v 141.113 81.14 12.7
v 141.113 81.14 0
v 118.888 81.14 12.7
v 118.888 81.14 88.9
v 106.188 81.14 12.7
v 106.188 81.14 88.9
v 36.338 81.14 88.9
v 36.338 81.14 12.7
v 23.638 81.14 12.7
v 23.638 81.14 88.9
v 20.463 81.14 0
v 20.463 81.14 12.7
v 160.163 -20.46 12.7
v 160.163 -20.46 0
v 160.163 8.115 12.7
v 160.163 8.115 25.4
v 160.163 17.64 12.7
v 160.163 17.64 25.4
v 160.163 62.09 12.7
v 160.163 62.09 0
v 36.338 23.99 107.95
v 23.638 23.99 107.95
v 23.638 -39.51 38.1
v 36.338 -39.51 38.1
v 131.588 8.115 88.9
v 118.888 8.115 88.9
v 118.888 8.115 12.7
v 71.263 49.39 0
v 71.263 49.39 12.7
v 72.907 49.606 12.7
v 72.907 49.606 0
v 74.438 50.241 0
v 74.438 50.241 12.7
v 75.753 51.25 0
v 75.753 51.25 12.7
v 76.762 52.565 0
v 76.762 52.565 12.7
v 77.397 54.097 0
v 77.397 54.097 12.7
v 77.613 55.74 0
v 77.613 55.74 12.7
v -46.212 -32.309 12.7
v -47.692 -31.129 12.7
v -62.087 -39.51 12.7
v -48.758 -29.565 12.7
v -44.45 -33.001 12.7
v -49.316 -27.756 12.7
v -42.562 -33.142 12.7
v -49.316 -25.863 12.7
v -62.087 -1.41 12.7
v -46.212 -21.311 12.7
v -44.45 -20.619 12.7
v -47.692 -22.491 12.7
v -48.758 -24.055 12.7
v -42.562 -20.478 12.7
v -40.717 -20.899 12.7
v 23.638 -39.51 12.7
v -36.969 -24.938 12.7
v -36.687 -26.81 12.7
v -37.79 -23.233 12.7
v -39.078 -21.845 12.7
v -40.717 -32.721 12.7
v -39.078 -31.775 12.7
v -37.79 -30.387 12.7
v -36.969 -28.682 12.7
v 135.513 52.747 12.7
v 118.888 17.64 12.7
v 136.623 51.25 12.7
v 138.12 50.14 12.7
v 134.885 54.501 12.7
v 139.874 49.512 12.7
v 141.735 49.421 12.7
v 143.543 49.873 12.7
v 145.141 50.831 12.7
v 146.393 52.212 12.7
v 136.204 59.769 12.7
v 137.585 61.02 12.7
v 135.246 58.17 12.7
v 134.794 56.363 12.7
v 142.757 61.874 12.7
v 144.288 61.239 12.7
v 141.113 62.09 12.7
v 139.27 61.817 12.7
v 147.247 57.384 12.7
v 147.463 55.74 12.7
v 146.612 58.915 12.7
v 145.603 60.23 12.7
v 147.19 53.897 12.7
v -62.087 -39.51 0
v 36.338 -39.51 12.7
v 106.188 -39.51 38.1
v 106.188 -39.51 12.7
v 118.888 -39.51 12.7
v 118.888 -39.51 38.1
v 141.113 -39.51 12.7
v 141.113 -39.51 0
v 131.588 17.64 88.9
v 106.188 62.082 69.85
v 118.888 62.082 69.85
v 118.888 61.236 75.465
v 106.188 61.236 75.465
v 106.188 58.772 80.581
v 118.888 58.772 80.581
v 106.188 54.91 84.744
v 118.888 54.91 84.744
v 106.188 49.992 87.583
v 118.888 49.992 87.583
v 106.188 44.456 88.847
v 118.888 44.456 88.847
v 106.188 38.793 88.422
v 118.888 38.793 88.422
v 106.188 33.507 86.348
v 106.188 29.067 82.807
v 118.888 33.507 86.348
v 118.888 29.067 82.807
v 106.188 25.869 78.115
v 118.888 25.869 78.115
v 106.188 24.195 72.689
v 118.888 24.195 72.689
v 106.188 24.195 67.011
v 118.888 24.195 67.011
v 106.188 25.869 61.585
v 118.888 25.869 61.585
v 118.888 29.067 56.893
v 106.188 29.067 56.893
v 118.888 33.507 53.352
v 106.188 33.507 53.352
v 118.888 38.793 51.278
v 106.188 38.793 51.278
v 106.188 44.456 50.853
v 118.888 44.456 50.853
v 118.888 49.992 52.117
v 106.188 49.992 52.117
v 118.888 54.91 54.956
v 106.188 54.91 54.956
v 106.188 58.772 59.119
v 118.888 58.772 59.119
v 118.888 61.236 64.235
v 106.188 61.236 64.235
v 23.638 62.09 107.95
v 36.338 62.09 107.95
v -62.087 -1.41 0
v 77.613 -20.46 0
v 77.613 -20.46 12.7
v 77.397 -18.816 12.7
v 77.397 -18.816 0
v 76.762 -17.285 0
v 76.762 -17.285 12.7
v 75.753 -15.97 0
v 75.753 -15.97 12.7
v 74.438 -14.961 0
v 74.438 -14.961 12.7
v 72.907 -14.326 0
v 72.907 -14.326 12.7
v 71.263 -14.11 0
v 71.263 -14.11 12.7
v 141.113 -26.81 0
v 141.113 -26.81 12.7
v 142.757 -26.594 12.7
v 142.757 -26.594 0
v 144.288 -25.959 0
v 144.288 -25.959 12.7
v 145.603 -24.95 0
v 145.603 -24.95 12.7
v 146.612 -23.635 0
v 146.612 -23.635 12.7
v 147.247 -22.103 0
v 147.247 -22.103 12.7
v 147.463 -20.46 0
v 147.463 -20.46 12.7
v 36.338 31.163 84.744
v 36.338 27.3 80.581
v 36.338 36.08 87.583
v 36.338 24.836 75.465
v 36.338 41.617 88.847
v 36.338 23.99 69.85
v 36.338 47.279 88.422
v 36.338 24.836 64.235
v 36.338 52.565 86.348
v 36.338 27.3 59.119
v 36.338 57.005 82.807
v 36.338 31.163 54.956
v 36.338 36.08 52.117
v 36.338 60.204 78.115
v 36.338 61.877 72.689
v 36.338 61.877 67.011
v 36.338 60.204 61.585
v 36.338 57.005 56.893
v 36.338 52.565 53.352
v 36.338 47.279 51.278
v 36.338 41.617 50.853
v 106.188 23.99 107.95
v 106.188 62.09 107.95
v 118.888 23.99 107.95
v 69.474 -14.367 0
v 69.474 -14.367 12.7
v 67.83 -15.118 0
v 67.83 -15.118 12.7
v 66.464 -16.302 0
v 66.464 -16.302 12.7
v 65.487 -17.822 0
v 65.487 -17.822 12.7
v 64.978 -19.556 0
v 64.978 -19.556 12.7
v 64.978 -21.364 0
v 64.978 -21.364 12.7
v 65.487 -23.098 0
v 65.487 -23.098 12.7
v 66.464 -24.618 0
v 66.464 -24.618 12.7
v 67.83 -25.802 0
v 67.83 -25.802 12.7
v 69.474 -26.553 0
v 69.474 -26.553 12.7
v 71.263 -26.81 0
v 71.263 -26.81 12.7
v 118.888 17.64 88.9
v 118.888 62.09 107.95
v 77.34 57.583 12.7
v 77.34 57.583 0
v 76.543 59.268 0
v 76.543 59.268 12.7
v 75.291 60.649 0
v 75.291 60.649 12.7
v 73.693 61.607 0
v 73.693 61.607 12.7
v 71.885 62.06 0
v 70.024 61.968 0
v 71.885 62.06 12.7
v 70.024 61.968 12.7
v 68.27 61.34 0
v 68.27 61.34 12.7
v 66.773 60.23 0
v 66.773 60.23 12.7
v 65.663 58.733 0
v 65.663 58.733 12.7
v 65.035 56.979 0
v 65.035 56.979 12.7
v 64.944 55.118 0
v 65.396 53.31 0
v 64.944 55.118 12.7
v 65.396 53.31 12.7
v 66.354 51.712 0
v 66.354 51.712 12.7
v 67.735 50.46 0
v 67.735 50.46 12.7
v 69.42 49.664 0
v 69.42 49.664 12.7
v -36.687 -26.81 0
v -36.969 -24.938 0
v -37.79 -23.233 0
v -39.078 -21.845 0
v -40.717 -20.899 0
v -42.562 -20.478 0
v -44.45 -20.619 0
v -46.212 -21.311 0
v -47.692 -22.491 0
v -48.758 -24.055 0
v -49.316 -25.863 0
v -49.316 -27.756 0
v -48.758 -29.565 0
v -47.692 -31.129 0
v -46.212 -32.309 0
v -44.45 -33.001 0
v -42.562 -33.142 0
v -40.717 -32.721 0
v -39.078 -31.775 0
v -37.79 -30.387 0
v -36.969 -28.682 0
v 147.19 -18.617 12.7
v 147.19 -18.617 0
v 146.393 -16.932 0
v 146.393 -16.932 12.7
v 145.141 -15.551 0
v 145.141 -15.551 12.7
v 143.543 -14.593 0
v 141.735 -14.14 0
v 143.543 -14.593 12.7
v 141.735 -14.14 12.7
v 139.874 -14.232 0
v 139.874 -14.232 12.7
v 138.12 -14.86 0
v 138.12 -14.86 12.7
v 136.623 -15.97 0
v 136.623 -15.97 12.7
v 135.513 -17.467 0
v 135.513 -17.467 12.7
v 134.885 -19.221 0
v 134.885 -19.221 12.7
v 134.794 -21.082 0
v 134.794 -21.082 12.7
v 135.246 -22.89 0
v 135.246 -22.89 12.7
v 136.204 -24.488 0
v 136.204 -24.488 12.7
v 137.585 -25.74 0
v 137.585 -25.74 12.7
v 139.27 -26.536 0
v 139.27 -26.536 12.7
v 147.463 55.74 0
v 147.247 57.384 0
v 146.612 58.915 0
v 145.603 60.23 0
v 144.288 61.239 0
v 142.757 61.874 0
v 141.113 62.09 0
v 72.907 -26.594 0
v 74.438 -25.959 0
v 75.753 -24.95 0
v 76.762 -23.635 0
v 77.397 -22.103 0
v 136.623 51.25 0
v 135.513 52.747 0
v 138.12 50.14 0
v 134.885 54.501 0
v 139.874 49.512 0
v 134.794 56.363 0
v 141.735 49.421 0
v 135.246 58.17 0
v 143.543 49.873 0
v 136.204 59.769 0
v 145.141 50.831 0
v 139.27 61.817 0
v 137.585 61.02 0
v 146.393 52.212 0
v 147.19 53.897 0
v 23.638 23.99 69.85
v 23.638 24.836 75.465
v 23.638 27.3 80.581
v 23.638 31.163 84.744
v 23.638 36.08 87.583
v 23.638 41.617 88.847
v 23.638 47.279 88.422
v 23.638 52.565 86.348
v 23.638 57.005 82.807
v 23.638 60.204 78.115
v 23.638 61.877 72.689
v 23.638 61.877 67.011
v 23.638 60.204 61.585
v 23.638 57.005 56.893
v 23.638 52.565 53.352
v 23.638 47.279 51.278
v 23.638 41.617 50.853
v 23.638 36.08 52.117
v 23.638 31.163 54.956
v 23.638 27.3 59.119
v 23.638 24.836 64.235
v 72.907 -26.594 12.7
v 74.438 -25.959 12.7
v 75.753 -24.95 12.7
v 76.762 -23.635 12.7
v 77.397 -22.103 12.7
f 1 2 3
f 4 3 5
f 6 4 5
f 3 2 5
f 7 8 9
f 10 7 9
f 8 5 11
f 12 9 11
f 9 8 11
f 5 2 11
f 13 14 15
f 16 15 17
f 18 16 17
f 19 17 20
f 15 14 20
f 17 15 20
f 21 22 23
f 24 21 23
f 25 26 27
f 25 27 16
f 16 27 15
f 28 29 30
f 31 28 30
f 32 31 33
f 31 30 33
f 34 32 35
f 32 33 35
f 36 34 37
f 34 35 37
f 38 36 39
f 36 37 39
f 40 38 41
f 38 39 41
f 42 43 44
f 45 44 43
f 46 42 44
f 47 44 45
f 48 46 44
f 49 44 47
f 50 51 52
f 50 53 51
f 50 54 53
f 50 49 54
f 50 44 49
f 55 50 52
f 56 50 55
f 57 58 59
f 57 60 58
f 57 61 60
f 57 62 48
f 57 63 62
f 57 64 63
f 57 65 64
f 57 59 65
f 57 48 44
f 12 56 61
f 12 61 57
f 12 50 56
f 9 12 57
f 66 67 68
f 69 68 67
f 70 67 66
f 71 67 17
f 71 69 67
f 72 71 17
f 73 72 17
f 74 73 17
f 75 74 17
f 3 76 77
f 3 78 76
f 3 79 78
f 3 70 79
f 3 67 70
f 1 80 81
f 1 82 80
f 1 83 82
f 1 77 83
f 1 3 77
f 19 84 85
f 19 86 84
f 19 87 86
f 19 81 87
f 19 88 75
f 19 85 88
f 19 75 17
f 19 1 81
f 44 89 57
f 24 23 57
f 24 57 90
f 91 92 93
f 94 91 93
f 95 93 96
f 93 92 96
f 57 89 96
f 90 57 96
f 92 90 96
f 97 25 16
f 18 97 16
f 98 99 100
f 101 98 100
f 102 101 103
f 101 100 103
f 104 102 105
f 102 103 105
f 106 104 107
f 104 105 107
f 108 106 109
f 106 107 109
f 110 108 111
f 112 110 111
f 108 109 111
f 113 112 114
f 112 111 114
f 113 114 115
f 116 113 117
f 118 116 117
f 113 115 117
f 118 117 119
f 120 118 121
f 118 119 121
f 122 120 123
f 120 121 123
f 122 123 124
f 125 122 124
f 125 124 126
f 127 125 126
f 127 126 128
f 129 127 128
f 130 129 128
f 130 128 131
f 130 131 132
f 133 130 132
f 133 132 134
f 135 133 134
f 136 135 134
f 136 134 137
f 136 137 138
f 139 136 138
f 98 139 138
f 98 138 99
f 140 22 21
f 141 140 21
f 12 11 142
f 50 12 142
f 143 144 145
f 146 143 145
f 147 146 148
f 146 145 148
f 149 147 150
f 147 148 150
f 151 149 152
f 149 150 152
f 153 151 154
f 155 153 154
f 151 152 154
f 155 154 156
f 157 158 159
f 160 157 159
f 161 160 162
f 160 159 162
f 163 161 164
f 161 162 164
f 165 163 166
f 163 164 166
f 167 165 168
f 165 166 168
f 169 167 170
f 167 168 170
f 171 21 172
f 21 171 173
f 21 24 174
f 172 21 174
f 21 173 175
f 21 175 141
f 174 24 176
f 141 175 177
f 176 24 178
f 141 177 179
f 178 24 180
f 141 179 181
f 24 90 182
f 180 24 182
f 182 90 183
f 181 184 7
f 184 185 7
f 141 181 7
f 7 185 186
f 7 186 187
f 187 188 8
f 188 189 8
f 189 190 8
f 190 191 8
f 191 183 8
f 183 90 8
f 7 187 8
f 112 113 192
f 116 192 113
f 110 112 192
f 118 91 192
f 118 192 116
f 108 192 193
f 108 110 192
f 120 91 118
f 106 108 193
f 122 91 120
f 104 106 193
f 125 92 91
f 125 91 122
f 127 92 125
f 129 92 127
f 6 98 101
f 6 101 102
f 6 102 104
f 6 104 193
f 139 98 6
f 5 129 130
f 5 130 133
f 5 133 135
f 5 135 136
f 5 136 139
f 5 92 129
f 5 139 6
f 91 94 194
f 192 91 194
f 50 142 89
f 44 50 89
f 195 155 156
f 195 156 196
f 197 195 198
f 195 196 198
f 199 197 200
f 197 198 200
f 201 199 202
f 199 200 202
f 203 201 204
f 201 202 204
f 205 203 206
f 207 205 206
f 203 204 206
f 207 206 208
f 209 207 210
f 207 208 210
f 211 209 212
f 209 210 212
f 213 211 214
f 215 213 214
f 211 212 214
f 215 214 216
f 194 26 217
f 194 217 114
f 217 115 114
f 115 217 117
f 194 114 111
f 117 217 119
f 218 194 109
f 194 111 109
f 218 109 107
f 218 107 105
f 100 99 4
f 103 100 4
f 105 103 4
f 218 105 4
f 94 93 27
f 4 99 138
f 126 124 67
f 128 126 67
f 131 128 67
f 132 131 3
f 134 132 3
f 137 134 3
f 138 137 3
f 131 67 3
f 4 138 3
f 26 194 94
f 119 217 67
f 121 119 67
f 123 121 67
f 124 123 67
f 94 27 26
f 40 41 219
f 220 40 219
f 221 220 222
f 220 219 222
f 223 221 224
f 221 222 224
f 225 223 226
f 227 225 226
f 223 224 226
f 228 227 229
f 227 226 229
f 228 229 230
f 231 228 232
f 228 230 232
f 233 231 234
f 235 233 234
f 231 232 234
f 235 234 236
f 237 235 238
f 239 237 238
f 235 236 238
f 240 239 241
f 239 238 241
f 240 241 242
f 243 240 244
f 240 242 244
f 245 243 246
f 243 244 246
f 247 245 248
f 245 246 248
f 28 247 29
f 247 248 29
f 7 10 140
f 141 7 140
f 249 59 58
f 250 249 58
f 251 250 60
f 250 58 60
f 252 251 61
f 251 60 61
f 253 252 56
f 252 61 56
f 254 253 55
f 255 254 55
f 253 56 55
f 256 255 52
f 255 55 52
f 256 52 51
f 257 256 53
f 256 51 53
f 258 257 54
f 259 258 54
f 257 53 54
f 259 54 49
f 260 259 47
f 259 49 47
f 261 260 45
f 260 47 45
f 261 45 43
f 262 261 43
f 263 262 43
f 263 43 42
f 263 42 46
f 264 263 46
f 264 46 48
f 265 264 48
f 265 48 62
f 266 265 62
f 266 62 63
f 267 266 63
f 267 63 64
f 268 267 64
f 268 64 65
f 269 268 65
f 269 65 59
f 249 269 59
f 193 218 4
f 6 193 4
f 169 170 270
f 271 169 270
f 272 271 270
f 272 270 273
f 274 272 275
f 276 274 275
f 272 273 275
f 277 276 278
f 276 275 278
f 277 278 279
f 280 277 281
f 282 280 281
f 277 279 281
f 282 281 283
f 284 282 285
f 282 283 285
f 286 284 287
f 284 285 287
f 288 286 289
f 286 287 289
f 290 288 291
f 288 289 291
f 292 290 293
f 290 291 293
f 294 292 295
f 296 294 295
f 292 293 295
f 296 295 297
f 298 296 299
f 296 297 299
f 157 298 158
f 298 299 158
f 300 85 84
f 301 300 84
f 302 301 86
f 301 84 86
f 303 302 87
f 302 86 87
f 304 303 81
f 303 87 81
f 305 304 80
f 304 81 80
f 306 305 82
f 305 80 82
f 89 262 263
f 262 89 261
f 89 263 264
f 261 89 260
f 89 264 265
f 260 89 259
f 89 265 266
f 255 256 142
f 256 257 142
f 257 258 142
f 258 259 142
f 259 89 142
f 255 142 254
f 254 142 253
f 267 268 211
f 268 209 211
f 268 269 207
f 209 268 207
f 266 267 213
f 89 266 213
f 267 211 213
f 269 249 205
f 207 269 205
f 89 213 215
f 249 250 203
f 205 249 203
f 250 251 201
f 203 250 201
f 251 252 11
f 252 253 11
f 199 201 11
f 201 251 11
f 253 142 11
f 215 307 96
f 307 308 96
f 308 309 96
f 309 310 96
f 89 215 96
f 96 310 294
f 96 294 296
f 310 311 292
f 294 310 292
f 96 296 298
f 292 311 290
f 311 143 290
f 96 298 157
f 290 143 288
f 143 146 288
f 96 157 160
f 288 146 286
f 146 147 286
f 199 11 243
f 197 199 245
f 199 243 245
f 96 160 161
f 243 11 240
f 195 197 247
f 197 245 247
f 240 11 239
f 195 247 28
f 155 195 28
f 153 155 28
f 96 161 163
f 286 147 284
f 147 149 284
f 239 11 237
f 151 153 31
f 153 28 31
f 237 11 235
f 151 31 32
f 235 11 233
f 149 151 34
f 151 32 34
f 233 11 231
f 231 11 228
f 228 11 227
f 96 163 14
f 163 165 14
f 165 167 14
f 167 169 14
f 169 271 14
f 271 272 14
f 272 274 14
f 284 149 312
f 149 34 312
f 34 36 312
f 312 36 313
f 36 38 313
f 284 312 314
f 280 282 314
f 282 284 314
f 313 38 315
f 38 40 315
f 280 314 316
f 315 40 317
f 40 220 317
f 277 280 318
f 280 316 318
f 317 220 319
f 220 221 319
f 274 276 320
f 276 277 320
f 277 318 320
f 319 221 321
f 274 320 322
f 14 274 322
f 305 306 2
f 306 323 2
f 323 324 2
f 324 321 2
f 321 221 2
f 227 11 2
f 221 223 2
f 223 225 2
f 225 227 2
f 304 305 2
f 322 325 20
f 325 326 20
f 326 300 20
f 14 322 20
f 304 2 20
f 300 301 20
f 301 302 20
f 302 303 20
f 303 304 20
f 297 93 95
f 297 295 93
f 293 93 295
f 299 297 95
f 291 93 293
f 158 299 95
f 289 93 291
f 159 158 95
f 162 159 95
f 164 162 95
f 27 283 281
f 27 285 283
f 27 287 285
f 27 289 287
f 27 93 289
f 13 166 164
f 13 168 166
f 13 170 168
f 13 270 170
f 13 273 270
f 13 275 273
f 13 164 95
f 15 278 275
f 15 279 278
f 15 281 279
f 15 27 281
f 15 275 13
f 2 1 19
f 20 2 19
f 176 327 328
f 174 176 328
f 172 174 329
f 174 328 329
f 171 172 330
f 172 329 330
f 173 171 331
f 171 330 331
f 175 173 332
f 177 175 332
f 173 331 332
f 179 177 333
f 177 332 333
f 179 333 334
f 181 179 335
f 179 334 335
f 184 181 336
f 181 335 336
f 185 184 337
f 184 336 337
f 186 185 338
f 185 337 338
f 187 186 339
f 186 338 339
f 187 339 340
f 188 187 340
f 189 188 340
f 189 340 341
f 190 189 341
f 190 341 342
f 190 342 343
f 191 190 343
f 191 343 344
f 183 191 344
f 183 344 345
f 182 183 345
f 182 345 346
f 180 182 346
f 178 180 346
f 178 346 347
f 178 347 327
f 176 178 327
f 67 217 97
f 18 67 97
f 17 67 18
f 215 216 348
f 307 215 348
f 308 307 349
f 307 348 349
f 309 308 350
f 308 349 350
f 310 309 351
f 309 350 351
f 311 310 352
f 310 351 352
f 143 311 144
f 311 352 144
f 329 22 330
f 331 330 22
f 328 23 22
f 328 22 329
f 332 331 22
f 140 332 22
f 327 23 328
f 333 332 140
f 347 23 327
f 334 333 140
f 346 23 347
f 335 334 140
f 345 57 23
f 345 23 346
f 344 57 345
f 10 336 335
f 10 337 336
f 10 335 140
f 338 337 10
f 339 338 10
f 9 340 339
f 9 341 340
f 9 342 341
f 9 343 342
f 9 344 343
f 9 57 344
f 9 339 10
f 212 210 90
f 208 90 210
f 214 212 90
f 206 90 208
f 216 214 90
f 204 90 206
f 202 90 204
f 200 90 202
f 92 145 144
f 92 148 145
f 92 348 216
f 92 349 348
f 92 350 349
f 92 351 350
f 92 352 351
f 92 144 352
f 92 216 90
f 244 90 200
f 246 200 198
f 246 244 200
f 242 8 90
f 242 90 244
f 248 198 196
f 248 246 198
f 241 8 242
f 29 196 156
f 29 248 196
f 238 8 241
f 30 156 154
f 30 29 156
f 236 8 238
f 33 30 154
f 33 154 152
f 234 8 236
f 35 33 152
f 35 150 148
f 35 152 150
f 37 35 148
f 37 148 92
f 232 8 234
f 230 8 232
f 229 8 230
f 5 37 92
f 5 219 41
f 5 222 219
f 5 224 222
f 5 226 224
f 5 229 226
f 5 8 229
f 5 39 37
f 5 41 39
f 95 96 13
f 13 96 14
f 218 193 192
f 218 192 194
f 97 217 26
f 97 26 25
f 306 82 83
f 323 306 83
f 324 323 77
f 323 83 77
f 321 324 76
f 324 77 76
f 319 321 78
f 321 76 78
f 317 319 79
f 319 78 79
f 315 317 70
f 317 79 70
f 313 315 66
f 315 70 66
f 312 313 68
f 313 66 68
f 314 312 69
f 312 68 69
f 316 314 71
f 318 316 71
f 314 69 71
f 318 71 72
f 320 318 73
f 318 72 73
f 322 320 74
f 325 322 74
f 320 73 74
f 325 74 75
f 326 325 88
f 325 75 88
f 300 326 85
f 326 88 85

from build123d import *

# Parameters (mm, degrees)
F1_DEPTH  = 12.7
F3_DEPTH  = 25.4
F4_W      = 12.7
F4_H      = 120.65
F5_DEPTH  = 95.25
F7_DEPTH  = 25.4
F9_DEPTH  = 25.4
F11_DEPTH = 25.4
F12_W     = 41.275
F12_H     = 9.525
F13_DEPTH = 76.2
F15_DEPTH = 25.4
F17_DEPTH = 25.4
F19_DEPTH = 25.4
F21_DEPTH = 25.4
F23_DEPTH = 25.4
F24_R     = 19.05
F25_DEPTH = 25.4
F27_DEPTH = 25.4


with BuildPart() as f1:
    # F0 (on Top) → F1 (new body)
    with BuildSketch(Plane.XY):
        Polygon((20.463030386, 81.1401112616), (-62.086969614, -1.4098887384), (-62.086969614, -39.5098887384), (141.113030386, -39.5098887384), (160.163030386, -20.4598887384), (160.163030386, 81.1401112616), (71.263030386, 81.1401112616), (36.338030386, 81.1401112616), align=None)
    extrude(amount=F1_DEPTH)

    # F2 (on face) → F3 (cut)
    with BuildSketch(Plane.XY.offset(12.7)):
        Polygon((160.163030386, 62.0901112616), (160.163030386, 81.1401112616), (141.113030386, 81.1401112616), align=None)
    extrude(amount=-F3_DEPTH, mode=Mode.SUBTRACT)

    # F4 (on face) → F5 (join)
    with BuildSketch(Plane.XY.offset(12.7)):
        with Locations((112.538030386, 20.8151112616)):
            Rectangle(F4_W, F4_H)
        with Locations((29.988030386, 20.8151112616)):
            Rectangle(F4_W, F4_H)
    extrude(amount=F5_DEPTH)

    # F6 (on face) → F7 (cut)
    with BuildSketch(Plane(origin=(23.638030386, 0, 0), x_dir=(0, -1, 0), z_dir=(-1, 0, 0))):
        Polygon((-62.0901112616, 107.95), (-81.1401112616, 107.95), (-81.1401112616, 88.9), align=None)
    extrude(amount=-F7_DEPTH, mode=Mode.SUBTRACT)

    # F8 (on face) → F9 (cut)
    with BuildSketch(Plane(origin=(23.638030386, 0, 0), x_dir=(0, -1, 0), z_dir=(-1, 0, 0))):
        Polygon((39.5098887384, 107.95), (-23.9901112616, 107.95), (39.5098887384, 38.1), align=None)
    extrude(amount=-F9_DEPTH, mode=Mode.SUBTRACT)

    # F10 (on face) → F11 (cut)
    with BuildSketch(Plane.YZ.offset(118.888030386)):
        Polygon((-39.5098887384, 38.1), (23.9901112616, 107.95), (-39.5098887384, 107.95), align=None)
        Polygon((62.0901112616, 107.95), (81.1401112616, 88.9), (81.1401112616, 107.95), align=None)
    extrude(amount=-F11_DEPTH, mode=Mode.SUBTRACT)

    # F12 (on face) → F13 (join)
    with BuildSketch(Plane.XY.offset(12.7)):
        with Locations((139.525530386, 12.8776112616)):
            Rectangle(F12_W, F12_H)
    extrude(amount=F13_DEPTH)

    # F14 (on face) → F15 (cut)
    with BuildSketch(Plane.XZ.offset(-8.1151112616)):
        Polygon((160.163030386, 88.9), (131.588030386, 88.9), (160.163030386, 25.4), align=None)
    extrude(amount=-F15_DEPTH, mode=Mode.SUBTRACT)

    # F16 (on face) → F17 (cut)
    with BuildSketch(Plane.XY.offset(12.7)):
        with BuildLine():
            ThreePointArc((-49.386969614, -26.8098887384), (-43.036969614, -33.1598887384), (-36.686969614, -26.8098887384))
            ThreePointArc((-36.686969614, -26.8098887384), (-43.036969614, -20.4598887384), (-49.386969614, -26.8098887384))
        make_face()
    extrude(amount=-F17_DEPTH, mode=Mode.SUBTRACT)

    # F18 (on face) → F19 (cut)
    with BuildSketch(Plane.XY.offset(12.7)):
        with BuildLine():
            ThreePointArc((141.113030386, -26.8098887384), (145.6031584465, -24.9500167989), (147.463030386, -20.4598887384))
            ThreePointArc((147.463030386, -20.4598887384), (136.6229023254, -15.9697606779), (141.113030386, -26.8098887384))
        make_face()
    extrude(amount=-F19_DEPTH, mode=Mode.SUBTRACT)

    # F20 (on face) → F21 (cut)
    with BuildSketch(Plane.XY.offset(12.7)):
        with BuildLine():
            ThreePointArc((147.463030386, 55.7401112616), (145.6031584465, 60.2302393221), (141.113030386, 62.0901112616))
            ThreePointArc((141.113030386, 62.0901112616), (136.6229023254, 51.2499832011), (147.463030386, 55.7401112616))
        make_face()
    extrude(amount=-F21_DEPTH, mode=Mode.SUBTRACT)

    # F22 (on face) → F23 (cut)
    with BuildSketch(Plane.XY.offset(12.7)):
        with BuildLine():
            ThreePointArc((71.263030386, -14.1098887384), (64.913030386, -20.4598887384), (71.263030386, -26.8098887384))
            Line((71.263030386, -26.8098887384), (71.263030386, -20.4598887384))
            Line((71.263030386, -20.4598887384), (71.263030386, -14.1098887384))
        make_face()
        with BuildLine():
            ThreePointArc((77.613030386, 55.7401112616), (66.7729023254, 60.2302393221), (71.263030386, 49.3901112616))
            ThreePointArc((71.263030386, 49.3901112616), (75.7531584465, 51.2499832011), (77.613030386, 55.7401112616))
        make_face()
        with BuildLine():
            Line((71.263030386, -20.4598887384), (71.263030386, -26.8098887384))
            ThreePointArc((71.263030386, -26.8098887384), (75.7531584465, -24.9500167989), (77.613030386, -20.4598887384))
            ThreePointArc((77.613030386, -20.4598887384), (75.7531584465, -15.9697606779), (71.263030386, -14.1098887384))
            Line((71.263030386, -14.1098887384), (71.263030386, -20.4598887384))
        make_face()
    extrude(amount=-F23_DEPTH, mode=Mode.SUBTRACT)

    # F24 (on face) → F25 (cut)
    with BuildSketch(Plane.YZ.offset(118.888030386)):
        with Locations((43.0320575833, 69.85)):
            Circle(F24_R)
    extrude(amount=-F25_DEPTH, mode=Mode.SUBTRACT)

    # F26 (on face) → F27 (cut)
    with BuildSketch(Plane(origin=(23.638030386, 0, 0), x_dir=(0, -1, 0), z_dir=(-1, 0, 0))):
        with BuildLine():
            ThreePointArc((-62.0901112616, 69.85), (-43.0401112616, 50.8), (-23.9901112616, 69.85))
            ThreePointArc((-23.9901112616, 69.85), (-43.0401112616, 88.9), (-62.0901112616, 69.85))
        make_face()
    extrude(amount=-F27_DEPTH, mode=Mode.SUBTRACT)


solid = f1.part
